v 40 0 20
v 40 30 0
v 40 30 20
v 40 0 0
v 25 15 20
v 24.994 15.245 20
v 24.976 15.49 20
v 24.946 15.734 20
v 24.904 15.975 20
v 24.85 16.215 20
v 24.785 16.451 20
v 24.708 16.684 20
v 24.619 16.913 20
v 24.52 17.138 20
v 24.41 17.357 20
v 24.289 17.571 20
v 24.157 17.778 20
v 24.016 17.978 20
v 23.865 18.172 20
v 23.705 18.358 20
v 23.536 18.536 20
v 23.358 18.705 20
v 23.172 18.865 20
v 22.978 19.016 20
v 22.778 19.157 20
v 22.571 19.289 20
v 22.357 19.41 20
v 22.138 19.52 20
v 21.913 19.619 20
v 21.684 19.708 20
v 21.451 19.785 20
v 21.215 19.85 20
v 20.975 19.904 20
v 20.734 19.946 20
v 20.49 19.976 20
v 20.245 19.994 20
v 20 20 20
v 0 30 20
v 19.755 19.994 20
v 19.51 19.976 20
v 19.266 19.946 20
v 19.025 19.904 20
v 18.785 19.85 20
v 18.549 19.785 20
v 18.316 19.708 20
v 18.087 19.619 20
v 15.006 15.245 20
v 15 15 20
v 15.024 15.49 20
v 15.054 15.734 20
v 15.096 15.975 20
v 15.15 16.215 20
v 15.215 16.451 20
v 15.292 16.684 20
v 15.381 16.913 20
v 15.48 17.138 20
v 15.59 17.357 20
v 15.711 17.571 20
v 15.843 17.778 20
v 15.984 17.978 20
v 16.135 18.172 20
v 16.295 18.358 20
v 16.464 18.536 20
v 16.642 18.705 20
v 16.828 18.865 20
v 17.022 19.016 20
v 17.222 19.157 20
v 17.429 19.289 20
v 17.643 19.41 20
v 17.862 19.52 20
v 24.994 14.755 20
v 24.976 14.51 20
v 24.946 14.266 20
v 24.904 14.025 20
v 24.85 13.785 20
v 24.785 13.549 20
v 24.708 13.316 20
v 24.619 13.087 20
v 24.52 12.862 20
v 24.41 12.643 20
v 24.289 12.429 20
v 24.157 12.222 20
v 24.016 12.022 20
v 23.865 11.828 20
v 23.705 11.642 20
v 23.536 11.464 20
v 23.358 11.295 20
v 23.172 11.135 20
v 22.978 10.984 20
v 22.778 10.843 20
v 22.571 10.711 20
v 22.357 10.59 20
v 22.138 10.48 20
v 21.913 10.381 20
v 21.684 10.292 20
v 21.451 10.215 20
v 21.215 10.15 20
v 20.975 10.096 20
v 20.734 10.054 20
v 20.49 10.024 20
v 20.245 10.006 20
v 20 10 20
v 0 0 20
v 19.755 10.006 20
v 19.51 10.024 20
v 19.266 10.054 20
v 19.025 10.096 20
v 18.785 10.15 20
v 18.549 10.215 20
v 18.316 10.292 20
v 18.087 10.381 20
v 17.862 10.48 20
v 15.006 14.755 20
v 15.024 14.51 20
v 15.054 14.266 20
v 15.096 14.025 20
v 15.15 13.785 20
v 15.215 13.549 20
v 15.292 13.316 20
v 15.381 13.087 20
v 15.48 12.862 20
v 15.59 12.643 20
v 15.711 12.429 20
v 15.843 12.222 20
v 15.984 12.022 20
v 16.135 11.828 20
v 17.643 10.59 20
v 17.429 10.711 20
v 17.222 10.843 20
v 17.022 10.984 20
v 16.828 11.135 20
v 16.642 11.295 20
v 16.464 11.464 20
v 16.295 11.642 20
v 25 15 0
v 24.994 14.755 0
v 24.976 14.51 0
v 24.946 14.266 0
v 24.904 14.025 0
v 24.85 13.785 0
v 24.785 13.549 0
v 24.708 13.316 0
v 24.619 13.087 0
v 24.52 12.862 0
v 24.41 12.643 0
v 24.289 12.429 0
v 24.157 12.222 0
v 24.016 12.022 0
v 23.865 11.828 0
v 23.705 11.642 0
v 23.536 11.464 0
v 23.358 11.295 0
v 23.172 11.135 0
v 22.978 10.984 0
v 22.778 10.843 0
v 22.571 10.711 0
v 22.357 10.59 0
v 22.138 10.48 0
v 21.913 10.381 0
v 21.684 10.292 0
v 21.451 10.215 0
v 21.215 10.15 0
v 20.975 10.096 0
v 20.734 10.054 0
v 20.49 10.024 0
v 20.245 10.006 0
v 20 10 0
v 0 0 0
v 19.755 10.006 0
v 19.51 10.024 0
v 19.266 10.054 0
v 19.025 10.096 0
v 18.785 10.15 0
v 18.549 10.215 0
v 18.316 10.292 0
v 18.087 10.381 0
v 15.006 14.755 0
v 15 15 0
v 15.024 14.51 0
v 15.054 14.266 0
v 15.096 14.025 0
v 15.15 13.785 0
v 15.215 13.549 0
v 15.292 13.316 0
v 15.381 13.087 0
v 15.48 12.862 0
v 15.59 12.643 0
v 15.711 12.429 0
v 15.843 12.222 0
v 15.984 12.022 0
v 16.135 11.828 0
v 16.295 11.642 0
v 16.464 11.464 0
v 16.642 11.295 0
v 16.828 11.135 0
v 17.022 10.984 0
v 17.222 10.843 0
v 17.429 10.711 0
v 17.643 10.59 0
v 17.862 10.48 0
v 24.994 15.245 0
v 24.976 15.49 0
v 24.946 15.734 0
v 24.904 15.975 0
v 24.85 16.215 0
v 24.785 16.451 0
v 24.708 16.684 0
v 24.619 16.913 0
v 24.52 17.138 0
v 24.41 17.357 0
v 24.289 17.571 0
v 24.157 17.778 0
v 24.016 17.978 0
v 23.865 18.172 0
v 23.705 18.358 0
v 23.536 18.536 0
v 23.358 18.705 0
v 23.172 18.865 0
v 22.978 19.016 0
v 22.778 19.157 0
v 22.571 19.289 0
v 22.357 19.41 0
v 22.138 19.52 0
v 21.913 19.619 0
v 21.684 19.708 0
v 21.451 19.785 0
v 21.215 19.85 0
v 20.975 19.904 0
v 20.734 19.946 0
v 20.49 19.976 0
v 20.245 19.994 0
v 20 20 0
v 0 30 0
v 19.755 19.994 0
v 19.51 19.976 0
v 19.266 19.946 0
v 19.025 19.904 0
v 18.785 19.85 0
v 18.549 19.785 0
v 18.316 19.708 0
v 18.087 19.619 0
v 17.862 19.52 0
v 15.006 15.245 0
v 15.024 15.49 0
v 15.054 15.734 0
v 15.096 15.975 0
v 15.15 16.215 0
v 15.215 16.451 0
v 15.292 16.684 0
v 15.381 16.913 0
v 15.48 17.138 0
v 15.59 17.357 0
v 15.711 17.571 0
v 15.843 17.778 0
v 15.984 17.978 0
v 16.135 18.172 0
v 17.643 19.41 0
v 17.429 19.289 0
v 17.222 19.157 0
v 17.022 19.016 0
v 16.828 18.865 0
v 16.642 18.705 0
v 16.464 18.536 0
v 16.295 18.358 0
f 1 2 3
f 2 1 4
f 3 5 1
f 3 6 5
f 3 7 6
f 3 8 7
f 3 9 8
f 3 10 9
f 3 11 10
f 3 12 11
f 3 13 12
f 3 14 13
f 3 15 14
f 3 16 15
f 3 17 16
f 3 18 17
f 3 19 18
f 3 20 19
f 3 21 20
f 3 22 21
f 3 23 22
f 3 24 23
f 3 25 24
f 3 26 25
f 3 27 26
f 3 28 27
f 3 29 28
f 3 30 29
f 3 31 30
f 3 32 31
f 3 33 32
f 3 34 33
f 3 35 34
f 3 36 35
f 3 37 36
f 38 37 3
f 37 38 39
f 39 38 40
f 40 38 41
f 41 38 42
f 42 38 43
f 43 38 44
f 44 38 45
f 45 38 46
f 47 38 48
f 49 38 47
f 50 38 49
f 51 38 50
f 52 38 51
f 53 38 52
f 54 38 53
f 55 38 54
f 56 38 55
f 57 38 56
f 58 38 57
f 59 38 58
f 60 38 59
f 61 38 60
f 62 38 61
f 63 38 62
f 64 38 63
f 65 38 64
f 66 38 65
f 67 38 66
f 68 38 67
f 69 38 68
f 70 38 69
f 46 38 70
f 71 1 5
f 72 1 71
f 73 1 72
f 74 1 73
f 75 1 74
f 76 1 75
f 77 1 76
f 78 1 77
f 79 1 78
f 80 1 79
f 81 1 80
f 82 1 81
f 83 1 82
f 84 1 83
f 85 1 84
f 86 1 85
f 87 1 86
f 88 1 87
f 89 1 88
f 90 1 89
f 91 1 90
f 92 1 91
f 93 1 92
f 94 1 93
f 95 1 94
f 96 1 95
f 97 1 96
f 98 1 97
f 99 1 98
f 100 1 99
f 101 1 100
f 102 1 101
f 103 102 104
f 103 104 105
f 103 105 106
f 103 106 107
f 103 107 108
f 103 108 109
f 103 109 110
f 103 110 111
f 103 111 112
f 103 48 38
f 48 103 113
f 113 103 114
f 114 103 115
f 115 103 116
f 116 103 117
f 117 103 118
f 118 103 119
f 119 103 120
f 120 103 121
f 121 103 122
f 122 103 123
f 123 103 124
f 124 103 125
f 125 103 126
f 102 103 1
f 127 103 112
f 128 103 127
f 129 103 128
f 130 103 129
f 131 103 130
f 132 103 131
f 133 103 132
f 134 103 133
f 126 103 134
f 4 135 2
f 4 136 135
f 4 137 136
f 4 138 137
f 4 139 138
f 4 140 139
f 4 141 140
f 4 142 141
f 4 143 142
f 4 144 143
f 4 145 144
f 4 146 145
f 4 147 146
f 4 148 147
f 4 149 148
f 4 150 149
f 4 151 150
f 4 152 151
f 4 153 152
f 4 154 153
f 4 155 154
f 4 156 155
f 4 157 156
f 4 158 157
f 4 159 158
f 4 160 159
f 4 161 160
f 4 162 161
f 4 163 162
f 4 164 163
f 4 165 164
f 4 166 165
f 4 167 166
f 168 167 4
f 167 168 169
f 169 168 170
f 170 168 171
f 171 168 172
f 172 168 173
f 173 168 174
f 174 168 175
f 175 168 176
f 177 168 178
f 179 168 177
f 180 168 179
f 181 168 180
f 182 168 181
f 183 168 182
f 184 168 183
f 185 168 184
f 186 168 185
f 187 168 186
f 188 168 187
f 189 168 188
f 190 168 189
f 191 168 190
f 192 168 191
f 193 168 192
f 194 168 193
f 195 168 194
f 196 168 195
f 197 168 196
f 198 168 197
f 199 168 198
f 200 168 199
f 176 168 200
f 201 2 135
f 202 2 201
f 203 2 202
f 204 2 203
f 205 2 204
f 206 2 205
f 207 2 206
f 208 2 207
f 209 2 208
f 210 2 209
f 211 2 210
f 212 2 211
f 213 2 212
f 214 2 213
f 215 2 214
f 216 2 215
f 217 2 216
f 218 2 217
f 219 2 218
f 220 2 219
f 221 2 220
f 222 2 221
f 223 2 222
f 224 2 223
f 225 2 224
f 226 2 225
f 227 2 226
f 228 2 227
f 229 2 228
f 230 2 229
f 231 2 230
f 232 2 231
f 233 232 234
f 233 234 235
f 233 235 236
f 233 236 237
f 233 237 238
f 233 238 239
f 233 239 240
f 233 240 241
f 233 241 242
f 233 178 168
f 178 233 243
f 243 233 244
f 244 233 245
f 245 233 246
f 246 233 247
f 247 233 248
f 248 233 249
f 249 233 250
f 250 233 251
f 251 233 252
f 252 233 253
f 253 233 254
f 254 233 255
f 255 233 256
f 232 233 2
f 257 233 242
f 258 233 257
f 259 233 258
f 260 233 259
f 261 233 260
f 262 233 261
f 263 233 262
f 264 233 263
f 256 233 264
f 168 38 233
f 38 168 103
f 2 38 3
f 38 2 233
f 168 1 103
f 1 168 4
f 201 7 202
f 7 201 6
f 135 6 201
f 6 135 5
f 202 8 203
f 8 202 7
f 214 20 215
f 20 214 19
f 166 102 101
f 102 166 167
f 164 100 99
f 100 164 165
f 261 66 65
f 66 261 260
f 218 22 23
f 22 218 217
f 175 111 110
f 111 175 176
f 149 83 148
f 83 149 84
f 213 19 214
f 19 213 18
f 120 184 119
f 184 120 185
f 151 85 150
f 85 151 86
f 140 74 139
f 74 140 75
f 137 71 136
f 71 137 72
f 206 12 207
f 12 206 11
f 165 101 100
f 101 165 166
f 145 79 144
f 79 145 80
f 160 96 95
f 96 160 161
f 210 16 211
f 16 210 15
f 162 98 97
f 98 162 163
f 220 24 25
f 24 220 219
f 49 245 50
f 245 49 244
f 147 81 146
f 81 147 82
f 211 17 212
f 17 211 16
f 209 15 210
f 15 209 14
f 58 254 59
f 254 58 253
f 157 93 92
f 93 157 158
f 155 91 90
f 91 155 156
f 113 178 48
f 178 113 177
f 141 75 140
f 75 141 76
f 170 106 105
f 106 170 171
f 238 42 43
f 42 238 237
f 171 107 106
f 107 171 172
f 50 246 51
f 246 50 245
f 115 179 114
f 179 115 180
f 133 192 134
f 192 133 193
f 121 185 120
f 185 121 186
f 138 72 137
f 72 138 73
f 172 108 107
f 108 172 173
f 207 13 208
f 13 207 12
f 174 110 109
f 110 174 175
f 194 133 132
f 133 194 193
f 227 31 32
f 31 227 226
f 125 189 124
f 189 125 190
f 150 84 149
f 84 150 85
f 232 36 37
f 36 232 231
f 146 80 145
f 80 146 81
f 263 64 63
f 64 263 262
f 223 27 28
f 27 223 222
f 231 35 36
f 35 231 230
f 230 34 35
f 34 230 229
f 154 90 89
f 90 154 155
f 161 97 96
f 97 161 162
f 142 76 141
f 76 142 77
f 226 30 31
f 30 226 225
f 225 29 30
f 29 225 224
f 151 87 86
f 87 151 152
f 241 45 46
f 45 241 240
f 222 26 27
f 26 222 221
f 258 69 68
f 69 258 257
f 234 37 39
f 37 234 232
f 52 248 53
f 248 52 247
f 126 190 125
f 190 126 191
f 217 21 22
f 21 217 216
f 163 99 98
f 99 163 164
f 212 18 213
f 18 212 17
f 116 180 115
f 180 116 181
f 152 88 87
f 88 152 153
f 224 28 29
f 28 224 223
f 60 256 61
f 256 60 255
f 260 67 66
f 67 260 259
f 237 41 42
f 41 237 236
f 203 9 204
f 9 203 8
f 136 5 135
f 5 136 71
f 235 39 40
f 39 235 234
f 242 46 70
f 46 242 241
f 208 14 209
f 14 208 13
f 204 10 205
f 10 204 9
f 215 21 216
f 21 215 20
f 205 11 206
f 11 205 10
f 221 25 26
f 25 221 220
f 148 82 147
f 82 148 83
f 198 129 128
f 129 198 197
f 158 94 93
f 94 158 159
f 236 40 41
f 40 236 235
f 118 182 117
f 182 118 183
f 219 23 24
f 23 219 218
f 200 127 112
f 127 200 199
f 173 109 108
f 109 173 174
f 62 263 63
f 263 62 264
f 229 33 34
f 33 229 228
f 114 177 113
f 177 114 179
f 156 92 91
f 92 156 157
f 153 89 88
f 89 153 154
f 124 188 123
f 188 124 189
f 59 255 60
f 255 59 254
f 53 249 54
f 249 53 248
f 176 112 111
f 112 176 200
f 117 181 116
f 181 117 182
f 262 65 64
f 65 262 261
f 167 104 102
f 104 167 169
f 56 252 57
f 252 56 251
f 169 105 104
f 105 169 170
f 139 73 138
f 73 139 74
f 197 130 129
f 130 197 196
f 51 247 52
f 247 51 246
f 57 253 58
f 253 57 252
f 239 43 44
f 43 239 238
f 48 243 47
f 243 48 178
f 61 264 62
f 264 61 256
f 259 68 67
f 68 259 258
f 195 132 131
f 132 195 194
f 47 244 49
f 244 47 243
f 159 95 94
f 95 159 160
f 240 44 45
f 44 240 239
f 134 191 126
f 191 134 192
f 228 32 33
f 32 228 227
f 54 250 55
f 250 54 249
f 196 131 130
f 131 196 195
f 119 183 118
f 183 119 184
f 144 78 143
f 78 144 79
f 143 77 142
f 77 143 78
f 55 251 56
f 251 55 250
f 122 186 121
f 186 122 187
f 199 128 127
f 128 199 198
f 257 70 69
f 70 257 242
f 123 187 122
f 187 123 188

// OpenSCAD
// ScanFit v0 ground-truth artefact.
// A 40 x 30 x 20 mm block with a 10 mm through-hole along its height.
// The worker's acceptance test reads the parameters below, so keep the
// "name = value;" form when editing them.
//
// Print it in a matte, light colour (or dust it with matte spray) so the
// cameras can see texture on it.

block_x = 40;   // mm
block_y = 30;   // mm
block_z = 20;   // mm
hole_d  = 10;   // mm, through the full height
hole_x  = 20;   // hole centre from the block's corner, mm
hole_y  = 15;

$fn = 128;

difference() {
    cube([block_x, block_y, block_z]);
    translate([hole_x, hole_y, -1])
        cylinder(d = hole_d, h = block_z + 2);
}
